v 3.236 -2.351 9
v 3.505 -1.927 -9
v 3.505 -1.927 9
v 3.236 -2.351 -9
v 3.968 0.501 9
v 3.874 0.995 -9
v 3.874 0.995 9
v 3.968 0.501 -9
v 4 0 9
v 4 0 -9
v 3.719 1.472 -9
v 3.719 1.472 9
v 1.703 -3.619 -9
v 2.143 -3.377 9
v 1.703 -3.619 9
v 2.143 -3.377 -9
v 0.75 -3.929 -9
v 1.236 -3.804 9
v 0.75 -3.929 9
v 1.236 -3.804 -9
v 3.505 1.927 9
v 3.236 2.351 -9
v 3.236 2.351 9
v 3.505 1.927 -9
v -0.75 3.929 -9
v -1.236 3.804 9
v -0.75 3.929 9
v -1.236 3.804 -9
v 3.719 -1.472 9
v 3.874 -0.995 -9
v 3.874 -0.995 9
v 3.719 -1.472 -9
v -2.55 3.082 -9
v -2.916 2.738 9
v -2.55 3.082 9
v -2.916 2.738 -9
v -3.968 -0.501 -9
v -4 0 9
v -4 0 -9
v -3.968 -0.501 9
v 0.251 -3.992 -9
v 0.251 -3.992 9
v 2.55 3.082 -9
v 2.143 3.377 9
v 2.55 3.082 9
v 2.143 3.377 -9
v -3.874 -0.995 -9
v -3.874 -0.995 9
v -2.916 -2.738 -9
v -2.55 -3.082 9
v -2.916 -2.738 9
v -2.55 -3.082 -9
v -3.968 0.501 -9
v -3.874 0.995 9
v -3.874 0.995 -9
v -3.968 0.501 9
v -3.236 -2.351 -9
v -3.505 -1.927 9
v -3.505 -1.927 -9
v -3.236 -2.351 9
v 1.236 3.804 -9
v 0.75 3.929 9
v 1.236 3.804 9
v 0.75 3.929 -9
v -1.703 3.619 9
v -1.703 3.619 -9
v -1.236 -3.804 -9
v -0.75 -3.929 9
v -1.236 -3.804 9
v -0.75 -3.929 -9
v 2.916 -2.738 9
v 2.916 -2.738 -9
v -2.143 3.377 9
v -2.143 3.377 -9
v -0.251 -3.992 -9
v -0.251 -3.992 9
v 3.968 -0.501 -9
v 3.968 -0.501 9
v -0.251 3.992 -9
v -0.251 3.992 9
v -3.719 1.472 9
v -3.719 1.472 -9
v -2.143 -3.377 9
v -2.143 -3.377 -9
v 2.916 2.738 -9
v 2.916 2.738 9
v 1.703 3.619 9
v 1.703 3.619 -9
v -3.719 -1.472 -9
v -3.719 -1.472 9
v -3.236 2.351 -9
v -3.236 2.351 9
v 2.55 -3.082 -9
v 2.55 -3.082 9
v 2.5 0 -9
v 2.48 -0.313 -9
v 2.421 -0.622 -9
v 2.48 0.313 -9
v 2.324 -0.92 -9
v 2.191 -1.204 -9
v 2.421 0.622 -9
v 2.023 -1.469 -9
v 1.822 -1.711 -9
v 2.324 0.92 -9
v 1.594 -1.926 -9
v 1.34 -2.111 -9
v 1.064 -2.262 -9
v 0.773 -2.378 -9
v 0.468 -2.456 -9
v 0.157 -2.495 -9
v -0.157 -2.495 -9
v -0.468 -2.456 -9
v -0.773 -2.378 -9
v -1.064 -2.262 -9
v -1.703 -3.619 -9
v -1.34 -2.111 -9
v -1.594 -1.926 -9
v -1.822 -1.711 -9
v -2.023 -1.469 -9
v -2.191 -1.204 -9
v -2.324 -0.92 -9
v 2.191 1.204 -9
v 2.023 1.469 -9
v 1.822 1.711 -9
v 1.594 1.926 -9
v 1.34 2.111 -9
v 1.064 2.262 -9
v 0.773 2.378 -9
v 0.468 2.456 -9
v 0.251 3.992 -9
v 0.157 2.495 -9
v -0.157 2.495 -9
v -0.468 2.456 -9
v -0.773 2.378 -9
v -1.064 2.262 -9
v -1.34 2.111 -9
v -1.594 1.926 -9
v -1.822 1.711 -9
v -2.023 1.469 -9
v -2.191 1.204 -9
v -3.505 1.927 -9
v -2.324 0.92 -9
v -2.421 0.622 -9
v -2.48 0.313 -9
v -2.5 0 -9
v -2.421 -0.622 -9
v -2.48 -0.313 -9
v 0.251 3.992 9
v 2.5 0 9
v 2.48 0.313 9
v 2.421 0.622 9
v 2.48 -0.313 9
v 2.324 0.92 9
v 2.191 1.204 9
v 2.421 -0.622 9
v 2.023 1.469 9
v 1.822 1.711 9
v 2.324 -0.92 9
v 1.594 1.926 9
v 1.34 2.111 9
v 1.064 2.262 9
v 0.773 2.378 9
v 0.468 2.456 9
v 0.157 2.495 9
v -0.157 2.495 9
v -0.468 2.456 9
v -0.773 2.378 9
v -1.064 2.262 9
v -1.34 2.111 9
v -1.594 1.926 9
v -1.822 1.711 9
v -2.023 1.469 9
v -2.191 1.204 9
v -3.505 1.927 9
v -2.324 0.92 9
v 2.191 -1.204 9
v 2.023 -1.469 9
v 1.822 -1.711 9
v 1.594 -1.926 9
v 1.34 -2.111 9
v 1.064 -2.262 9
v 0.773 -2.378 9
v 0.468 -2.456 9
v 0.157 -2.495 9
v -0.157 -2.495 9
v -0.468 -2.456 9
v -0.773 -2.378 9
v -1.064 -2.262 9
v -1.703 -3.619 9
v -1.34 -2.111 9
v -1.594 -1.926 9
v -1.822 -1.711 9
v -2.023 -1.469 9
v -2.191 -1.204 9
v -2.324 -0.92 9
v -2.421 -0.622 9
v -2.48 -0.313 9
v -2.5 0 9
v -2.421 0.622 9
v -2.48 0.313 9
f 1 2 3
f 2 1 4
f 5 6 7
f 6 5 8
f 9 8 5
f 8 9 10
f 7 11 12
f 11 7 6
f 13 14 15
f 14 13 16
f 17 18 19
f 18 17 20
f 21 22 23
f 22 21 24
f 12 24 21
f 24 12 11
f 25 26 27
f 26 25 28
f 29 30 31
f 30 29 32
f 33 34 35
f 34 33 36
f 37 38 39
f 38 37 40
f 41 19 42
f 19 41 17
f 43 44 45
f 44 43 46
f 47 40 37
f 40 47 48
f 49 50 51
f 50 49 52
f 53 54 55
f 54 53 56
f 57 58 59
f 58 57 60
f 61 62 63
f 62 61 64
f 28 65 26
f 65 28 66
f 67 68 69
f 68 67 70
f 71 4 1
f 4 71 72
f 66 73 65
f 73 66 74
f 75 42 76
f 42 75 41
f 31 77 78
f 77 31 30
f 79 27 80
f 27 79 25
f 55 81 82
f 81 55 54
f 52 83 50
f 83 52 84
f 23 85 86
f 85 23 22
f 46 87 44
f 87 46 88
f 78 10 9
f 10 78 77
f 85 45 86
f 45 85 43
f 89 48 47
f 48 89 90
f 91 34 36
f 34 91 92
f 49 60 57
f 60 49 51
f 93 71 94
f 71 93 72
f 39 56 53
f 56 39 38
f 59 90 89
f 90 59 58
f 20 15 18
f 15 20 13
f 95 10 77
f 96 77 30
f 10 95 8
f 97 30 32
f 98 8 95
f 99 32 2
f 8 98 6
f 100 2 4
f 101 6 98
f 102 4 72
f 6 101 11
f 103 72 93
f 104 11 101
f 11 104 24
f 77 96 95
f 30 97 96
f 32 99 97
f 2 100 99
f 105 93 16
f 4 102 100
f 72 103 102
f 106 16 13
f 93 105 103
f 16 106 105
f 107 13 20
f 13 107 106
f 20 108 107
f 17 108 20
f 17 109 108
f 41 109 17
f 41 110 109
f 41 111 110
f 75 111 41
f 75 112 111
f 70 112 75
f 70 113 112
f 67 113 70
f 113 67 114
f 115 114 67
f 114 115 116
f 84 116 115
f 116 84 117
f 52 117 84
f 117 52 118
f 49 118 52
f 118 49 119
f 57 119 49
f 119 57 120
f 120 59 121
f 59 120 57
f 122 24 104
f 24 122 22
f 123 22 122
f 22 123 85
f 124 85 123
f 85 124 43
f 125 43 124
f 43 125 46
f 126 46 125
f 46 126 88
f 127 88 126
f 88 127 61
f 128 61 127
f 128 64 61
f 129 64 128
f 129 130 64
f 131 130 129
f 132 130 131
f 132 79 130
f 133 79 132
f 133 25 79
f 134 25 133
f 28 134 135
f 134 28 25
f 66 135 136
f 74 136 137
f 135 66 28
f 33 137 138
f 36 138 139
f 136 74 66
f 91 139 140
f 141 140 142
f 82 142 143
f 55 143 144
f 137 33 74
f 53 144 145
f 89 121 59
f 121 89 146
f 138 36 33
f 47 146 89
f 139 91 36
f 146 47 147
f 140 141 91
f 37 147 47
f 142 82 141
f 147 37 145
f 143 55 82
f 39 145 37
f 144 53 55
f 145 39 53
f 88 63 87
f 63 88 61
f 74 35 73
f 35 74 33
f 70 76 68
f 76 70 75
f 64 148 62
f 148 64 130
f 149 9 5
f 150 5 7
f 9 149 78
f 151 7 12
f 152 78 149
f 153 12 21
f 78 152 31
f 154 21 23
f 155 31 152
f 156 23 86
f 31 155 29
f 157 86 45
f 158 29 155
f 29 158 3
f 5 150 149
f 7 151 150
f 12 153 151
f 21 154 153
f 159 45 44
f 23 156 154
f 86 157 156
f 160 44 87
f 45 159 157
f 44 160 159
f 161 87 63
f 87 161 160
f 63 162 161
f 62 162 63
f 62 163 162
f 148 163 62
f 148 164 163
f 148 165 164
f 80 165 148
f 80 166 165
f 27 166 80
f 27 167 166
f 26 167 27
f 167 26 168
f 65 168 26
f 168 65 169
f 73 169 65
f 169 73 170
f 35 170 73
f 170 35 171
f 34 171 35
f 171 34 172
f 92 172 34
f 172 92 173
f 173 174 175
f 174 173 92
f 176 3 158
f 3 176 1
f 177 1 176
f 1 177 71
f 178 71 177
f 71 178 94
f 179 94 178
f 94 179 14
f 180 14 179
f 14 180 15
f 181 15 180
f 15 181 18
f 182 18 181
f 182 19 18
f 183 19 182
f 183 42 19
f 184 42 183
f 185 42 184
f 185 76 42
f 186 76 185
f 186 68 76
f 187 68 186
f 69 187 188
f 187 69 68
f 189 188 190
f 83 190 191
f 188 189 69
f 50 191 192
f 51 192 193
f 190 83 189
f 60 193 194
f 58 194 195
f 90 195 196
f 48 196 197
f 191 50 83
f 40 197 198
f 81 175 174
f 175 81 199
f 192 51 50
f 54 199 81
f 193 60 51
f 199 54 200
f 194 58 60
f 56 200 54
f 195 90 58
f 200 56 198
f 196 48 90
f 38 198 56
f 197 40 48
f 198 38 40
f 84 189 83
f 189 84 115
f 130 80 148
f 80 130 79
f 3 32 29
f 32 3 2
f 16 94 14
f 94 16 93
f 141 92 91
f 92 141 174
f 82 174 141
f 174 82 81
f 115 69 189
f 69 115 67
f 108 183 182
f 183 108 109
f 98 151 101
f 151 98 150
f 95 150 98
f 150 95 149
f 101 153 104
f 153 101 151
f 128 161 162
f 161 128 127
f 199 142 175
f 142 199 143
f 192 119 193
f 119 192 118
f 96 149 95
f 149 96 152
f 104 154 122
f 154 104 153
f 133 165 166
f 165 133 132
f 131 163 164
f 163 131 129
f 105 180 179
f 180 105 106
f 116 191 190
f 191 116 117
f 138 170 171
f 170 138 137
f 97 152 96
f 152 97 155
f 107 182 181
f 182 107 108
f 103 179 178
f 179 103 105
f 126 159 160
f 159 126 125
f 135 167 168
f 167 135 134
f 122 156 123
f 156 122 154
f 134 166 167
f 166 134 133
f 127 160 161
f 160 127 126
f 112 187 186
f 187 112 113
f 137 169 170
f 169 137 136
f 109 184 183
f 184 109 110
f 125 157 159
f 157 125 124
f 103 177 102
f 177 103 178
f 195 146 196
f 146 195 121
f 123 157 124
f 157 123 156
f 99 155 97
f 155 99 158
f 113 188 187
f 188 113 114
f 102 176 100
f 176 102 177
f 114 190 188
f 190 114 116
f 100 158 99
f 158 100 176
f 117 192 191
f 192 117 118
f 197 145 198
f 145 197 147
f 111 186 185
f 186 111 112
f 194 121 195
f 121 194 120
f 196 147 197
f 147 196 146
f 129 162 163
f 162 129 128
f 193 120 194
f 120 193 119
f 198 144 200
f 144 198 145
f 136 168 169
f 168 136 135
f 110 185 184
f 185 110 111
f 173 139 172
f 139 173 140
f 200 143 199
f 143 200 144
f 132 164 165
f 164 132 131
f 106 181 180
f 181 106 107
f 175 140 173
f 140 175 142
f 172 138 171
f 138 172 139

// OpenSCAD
$fn = 50;


difference() {
	union() {
		translate(v = [0, 0, -9.0000000000]) {
			cylinder(h = 18, r = 4.0000000000);
		}
	}
	union() {
		translate(v = [0, 0, -100.0000000000]) {
			cylinder(h = 200, r = 2.5000000000);
		}
	}
}
